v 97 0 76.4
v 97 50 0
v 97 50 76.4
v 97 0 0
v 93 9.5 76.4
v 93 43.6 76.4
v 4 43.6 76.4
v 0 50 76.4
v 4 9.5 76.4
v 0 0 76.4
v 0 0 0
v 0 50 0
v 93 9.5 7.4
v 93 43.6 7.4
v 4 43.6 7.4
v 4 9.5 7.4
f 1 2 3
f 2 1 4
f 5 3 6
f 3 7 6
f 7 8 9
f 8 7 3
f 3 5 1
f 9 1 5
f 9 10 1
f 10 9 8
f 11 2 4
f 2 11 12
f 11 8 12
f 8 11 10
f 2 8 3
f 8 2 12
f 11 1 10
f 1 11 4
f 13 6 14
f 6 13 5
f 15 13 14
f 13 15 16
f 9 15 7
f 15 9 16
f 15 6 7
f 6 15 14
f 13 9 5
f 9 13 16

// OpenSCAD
//Wandstärke
t=2.4;

//Breite Innenbox
bi=89;
//Tiefe Innenbox
ti=36.5-t;
//Hoehe Innenbox
hi=69;

//Breite Aussenbox
ba=97;
//Tiefe Aussenbox
ta=50;
//Hoehe Aussenbox
ha=74+t;

//Abstand Innenbox zur Rueckseite
ar=4;


//Innenraum des Zahnputzhalters
module innenbox()
{
    cube([bi, ti, hi]);
}

module aussenbox()
{
    cube([ba, ta, ha]);
}

module carveouthinten()
{
    //breite bi+t+t
    //startet 2 unter der oberen platte der aussenbox
    //und ist ar tief und ha hoch
}

module zahnputzhalter()
{
    difference()
    {
        aussenbox();
        //mittig in der Breite, ar von hinten, oben buendig (+1 damit oben sauber offen)
        translate([(ba-bi)/2, ta-ar-ti-t, ha-hi])
        cube([bi, ti, hi+1]);
    }
}

zahnputzhalter();
